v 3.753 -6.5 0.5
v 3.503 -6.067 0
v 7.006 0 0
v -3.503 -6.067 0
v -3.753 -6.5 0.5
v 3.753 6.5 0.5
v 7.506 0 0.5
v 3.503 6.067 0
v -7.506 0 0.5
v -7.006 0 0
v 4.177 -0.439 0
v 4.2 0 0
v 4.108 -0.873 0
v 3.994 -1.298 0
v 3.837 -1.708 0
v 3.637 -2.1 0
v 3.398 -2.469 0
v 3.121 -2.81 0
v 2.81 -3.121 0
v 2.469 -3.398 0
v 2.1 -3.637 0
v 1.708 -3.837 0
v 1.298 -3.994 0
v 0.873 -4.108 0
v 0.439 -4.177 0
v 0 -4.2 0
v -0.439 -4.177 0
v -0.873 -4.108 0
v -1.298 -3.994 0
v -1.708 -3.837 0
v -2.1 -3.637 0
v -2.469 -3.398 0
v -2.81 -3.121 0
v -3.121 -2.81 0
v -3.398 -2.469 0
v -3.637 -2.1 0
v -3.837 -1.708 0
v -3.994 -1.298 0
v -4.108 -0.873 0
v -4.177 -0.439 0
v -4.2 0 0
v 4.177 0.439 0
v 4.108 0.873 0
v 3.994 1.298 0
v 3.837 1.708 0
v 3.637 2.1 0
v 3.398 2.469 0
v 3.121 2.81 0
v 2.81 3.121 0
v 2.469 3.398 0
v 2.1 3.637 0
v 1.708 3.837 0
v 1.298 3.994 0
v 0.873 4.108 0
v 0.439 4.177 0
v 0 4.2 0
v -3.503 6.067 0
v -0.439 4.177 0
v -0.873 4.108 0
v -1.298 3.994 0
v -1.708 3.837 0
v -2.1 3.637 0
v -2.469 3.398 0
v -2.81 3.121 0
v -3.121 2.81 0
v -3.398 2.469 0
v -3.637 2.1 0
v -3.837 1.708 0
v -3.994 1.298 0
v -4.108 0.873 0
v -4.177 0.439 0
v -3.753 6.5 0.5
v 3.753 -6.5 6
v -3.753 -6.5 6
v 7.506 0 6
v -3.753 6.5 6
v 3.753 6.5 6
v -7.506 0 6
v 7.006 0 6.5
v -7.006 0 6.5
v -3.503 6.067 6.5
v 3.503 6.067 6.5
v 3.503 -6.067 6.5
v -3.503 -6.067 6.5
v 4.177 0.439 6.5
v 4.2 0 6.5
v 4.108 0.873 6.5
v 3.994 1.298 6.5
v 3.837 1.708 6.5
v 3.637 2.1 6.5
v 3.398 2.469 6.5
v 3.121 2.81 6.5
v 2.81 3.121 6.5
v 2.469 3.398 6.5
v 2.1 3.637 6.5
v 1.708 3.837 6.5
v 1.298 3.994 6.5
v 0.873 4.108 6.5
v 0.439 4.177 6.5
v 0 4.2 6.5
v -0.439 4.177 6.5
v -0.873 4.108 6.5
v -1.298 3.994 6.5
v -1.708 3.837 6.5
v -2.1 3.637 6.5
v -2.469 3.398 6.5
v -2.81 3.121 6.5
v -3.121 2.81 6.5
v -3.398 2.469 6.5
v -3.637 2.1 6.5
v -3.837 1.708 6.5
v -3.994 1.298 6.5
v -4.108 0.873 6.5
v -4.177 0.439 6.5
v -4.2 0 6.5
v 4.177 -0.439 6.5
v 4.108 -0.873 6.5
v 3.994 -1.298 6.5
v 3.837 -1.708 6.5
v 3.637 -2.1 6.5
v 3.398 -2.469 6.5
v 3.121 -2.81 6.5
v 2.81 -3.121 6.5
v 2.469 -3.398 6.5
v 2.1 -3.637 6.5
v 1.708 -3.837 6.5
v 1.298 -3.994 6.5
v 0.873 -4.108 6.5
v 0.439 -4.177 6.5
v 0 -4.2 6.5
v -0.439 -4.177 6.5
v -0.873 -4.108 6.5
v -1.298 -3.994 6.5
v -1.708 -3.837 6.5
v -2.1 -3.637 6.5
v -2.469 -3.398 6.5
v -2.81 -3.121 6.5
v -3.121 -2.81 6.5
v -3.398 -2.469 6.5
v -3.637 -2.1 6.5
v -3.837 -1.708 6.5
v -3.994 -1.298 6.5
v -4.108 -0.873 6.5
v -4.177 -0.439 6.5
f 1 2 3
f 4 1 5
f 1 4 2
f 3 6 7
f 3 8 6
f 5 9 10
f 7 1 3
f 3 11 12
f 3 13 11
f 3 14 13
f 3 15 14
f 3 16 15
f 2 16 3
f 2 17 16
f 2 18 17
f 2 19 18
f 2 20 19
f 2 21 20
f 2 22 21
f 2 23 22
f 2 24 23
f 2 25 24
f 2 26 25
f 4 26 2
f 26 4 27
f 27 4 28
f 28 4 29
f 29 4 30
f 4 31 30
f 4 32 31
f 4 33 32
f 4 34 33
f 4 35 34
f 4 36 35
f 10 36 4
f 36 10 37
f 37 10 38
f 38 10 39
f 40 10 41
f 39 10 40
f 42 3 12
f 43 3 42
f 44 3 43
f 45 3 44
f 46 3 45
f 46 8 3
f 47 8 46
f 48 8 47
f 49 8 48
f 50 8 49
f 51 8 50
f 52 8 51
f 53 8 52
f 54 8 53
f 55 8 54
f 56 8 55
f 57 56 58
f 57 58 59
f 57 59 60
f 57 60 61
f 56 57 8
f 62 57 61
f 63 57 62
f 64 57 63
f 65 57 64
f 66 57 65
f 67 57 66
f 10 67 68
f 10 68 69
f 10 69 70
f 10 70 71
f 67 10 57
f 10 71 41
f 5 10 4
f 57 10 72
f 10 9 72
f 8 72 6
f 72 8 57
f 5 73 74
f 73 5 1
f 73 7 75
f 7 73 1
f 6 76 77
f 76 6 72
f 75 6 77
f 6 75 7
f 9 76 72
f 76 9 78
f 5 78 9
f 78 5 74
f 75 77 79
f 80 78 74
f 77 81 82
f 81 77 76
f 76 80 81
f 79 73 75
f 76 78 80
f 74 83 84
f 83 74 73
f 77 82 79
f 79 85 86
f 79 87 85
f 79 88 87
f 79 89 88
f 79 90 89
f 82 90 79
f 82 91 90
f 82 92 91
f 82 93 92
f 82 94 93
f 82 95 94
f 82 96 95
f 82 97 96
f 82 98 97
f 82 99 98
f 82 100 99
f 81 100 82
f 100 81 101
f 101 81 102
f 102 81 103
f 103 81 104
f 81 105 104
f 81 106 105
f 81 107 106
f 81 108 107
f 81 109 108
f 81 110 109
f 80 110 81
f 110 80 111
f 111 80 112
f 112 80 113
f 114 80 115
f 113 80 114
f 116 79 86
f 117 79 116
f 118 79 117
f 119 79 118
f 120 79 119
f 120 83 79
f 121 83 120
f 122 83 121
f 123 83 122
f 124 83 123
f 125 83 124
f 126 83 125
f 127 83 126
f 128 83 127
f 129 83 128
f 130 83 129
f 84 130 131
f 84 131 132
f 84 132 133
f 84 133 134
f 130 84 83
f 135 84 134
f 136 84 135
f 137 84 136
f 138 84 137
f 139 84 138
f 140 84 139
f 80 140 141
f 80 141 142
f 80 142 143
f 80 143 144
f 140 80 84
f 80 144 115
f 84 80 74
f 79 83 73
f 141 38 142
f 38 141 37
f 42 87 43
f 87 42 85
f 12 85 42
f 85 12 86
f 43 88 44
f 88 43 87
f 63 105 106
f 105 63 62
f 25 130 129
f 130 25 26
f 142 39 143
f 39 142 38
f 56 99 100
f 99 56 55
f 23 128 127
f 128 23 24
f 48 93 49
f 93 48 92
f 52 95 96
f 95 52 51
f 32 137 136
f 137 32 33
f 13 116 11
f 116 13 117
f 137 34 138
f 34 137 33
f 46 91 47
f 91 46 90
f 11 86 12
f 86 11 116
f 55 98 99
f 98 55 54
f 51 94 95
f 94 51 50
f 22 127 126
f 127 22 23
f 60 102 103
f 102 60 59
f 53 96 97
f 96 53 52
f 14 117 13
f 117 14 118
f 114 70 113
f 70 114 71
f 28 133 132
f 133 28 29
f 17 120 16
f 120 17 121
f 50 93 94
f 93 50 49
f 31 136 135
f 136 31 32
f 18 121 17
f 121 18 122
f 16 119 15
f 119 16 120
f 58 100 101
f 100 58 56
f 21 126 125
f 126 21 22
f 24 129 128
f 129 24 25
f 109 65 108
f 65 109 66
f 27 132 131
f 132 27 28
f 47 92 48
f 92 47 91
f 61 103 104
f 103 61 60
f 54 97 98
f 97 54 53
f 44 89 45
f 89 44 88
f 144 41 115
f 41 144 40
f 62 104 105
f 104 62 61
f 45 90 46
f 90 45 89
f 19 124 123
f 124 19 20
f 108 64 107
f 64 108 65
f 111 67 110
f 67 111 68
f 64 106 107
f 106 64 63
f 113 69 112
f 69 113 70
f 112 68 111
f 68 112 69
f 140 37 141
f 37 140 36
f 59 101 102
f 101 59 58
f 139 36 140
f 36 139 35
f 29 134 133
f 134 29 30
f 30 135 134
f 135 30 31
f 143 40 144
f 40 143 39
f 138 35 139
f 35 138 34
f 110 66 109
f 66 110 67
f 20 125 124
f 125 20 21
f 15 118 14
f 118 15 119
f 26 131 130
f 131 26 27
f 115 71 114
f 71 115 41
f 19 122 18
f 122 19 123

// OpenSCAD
// Through hex nut.
$fn = 60;
eps = 0.02;
thread_clearance_d = 8.4;
flat = 13;
thickness = 6.5;
chamfer = 0.5;
difference() {
    union() {
        cylinder(d1 = flat / cos(30) - 2 * chamfer, d2 = flat / cos(30), h = chamfer, $fn = 6);
        translate([0, 0, chamfer]) cylinder(d = flat / cos(30), h = thickness - 2 * chamfer, $fn = 6);
        translate([0, 0, thickness - chamfer]) cylinder(d1 = flat / cos(30), d2 = flat / cos(30) - 2 * chamfer, h = chamfer, $fn = 6);
    }
    translate([0, 0, -eps]) cylinder(d = thread_clearance_d, h = thickness + 2 * eps);
}
